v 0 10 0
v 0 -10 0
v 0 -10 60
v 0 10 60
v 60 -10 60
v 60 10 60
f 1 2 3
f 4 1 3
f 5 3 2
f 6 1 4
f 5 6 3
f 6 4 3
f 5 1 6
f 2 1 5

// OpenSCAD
dx=0;
dy=0;
dz=0;

// ignore variable values
x0=10;
y0=10;
z0=10;
sx=(dx+x0)/x0;
sy=(dy+y0)/y0;
sz=(dz+z0)/z0;

echo(version());
cube_size = 20; // [10:Small,20:Medium,30:Large]

hole_diameter = 2.5;
hole_radius = hole_diameter/2;

// How deep should the center hole be?
hole_depth = 1; // [0,1,5,50]

show_wheels = "yes"; // [yes,no]

// How thick should the side wheels be?
wheel_thickness = 1; // [1:20]

// ignore this variable!
// foo=1;

// don't turn functions into params!
function BEZ03(u) = pow((1-u), 3);

// ignore variable values
bing = 3+4;
baz = 3 / hole_depth;

module triangle(scale) {polyhedron(points = [[0, -10, 60], [0, 10, 60], [0, 10, 0], [0, -10, 0], [60, -10, 60], [60, 10, 60]], 
triangles = [[0,3,2], [0,2,1], [3,0,4], [1,2,5], [0,5,4], [0,1,5],  [5,2,4], [4,2,3], ]);}

//resize(newsize=[X,Y,Z]) triangle(1);
scale([sx,sy,sz]) triangle(1);
